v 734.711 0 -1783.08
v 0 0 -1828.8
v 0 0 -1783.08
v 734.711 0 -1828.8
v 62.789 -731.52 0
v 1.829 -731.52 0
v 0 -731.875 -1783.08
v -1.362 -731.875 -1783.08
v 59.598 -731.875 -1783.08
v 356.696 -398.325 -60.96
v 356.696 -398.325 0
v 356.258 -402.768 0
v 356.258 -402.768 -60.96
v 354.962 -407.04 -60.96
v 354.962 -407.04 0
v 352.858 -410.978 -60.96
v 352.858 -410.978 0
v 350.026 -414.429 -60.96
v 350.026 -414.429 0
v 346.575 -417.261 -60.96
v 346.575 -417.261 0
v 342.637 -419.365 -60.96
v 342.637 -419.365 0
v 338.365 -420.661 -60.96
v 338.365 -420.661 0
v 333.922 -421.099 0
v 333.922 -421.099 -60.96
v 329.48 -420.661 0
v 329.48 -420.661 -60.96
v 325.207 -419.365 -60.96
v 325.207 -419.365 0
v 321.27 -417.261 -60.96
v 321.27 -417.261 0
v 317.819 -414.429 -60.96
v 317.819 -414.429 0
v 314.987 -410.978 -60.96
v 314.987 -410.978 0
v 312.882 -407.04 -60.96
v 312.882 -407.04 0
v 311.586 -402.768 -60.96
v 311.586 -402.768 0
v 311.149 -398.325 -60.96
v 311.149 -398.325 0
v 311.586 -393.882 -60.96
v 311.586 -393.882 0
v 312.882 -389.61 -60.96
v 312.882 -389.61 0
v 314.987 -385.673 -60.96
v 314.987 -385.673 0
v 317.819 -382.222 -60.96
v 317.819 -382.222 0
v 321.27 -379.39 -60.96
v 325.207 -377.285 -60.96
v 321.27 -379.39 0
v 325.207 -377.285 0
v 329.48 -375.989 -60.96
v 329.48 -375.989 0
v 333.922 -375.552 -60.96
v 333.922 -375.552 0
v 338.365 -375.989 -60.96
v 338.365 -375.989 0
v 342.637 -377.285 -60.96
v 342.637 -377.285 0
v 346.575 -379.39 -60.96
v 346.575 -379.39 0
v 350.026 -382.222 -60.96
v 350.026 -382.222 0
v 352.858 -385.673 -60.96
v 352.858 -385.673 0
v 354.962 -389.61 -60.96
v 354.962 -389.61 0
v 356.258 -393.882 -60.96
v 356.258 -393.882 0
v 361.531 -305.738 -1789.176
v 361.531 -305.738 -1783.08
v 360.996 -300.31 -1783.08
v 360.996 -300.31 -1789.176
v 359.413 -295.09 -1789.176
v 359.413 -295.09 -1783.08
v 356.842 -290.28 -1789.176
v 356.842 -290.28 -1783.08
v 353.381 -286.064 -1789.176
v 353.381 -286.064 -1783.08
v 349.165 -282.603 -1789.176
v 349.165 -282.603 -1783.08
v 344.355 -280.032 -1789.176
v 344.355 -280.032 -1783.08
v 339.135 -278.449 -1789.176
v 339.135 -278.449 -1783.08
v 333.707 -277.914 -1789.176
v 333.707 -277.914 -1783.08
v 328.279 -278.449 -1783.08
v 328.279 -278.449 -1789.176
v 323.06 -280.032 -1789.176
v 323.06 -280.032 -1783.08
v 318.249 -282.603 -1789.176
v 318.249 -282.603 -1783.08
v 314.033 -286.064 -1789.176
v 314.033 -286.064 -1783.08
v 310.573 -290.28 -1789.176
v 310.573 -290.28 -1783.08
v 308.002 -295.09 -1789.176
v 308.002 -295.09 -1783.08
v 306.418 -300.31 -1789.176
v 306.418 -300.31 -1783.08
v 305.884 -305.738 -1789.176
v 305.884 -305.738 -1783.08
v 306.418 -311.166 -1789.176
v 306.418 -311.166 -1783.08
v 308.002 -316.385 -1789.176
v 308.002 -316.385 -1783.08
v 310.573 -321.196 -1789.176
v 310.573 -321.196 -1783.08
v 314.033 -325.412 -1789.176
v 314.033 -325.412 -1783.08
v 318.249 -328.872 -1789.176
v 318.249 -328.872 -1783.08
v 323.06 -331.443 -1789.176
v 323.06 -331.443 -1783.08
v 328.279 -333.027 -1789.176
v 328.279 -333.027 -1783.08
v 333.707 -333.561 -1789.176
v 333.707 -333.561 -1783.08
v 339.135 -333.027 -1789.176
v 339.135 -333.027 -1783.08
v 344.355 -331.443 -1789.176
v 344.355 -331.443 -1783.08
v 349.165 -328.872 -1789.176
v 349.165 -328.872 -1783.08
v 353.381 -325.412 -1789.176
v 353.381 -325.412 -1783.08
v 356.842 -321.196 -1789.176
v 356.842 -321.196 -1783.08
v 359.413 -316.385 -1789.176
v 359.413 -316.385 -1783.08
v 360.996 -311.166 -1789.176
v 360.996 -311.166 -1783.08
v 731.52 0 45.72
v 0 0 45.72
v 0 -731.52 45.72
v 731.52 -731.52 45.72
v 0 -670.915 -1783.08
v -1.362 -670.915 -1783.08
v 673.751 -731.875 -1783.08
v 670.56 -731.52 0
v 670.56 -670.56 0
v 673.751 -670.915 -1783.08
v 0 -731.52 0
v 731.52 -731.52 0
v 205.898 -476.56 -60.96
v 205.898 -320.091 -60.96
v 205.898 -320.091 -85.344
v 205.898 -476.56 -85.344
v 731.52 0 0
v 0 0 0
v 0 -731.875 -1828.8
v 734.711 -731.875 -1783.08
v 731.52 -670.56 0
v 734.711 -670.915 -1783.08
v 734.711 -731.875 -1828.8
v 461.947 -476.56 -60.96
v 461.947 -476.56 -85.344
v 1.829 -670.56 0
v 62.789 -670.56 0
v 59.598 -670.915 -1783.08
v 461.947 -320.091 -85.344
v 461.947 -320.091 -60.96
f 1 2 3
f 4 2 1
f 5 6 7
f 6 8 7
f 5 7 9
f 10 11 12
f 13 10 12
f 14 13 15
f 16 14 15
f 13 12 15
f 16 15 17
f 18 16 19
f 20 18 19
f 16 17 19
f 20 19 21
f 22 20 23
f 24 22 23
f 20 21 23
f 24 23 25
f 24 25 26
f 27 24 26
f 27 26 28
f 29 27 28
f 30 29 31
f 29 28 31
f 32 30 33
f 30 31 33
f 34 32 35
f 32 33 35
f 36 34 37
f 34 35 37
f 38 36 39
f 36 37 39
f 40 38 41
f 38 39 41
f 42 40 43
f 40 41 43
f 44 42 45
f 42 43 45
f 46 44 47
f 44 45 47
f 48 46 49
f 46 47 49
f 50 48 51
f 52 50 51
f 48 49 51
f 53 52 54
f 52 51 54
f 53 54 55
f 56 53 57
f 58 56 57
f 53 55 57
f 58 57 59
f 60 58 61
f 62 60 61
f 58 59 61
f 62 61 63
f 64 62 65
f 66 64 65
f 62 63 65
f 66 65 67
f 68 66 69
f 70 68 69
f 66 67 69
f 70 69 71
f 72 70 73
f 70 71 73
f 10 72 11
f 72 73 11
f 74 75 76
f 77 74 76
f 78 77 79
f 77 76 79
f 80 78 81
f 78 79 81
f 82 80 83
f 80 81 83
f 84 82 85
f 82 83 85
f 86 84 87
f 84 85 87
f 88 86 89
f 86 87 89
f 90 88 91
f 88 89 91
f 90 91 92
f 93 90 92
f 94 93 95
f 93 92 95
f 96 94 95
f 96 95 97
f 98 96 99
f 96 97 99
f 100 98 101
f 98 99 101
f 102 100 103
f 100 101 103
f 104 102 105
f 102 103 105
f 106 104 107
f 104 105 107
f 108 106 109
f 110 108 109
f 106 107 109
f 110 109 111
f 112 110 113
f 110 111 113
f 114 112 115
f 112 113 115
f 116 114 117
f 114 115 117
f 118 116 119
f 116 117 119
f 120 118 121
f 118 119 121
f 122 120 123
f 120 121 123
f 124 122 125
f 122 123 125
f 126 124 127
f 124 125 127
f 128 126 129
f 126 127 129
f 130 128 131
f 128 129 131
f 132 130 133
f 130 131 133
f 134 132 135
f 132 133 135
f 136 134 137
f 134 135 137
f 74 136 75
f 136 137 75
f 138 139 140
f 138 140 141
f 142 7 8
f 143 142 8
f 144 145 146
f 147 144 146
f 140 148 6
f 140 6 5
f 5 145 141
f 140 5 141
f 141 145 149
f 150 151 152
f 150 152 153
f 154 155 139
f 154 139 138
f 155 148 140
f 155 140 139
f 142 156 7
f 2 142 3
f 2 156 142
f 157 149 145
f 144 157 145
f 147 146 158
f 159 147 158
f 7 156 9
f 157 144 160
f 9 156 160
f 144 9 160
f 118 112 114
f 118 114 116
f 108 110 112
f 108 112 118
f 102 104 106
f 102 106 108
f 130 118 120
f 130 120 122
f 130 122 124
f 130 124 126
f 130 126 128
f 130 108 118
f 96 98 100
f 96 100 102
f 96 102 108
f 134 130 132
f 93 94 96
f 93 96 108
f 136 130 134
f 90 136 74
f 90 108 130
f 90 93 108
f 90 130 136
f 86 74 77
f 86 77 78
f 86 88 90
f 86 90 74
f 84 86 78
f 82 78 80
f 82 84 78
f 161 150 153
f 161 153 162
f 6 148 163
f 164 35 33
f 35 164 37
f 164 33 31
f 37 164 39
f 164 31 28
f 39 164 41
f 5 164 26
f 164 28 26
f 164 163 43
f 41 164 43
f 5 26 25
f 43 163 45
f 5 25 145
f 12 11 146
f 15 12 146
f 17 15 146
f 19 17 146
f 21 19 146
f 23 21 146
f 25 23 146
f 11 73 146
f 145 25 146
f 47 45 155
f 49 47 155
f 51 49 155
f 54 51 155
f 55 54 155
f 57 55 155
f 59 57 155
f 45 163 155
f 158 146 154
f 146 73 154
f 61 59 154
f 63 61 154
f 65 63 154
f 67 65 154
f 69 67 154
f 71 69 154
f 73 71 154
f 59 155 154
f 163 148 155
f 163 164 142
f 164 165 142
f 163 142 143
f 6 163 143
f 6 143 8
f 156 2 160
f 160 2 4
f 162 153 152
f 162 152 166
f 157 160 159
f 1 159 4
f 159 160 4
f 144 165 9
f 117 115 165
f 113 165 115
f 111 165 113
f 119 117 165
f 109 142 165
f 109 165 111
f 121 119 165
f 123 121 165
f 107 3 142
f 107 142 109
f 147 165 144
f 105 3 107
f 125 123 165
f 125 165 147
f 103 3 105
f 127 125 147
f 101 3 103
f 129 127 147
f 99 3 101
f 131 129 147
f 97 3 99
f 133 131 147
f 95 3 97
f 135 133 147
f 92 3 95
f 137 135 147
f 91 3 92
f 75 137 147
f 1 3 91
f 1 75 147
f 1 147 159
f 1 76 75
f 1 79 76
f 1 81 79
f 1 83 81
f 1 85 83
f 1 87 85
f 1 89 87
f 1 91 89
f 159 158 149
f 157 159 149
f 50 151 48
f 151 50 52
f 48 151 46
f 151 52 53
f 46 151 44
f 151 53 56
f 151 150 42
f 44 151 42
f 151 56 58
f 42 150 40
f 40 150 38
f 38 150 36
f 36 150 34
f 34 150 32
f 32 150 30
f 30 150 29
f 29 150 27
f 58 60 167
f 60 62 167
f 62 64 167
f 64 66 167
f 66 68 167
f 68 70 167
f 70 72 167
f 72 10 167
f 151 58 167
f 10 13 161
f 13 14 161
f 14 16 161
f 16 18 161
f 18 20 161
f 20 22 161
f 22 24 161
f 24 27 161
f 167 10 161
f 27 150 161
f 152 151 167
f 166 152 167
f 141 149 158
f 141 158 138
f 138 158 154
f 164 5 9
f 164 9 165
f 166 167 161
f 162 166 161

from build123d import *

# Parameters (mm, degrees)
F0_W      = 731.52
F0_H      = 731.52
F1_DEPTH  = 45.72
F3_W      = 734.7105741501
F3_H      = 731.8749427795
F4_DEPTH  = 45.72
F5_W      = 60.96
F5_H      = 60.96
F6_W      = 60.96
F6_H      = 60.96
F12_R     = 27.8235207136
F13_DEPTH = 6.096
F14_R     = 22.7734806104
F15_DEPTH = 60.96
F16_W     = 256.0497522354
F16_H     = 156.4687490463
F16_R     = 22.7734806104
F17_DEPTH = 24.384


with BuildPart() as f1:
    # F0 (on Top) → F1 (new body)
    with BuildSketch(Plane.XY):
        with Locations((365.76, -365.76)):
            Rectangle(F0_W, F0_H)
    extrude(amount=F1_DEPTH)

    # F14 (on face) → F15 (join)
    with BuildSketch(Plane(origin=(0, 0, 0), x_dir=(1, 0, 0), z_dir=(0, 0, -1))):
        with Locations((333.9223861694, 398.3253240585)):
            Circle(F14_R)
    extrude(amount=F15_DEPTH)



with BuildPart() as f4:
    # F3 (on offset) → F4 (new body)
    with BuildSketch(Plane.XY.offset(-1828.8)):
        with Locations((367.355287075, -365.9374713898)):
            Rectangle(F3_W, F3_H)
    extrude(amount=F4_DEPTH)

    # F12 (on face) → F13 (cut)
    with BuildSketch(Plane.XY.offset(-1783.08)):
        with Locations((333.7072134018, -305.7377934456)):
            Circle(F12_R)
    extrude(amount=-F13_DEPTH, mode=Mode.SUBTRACT)


with BuildPart() as f7:
    # F5 (on face) → F7 section 0
    with BuildSketch(Plane(origin=(0, 0, 0), x_dir=(1, 0, 0), z_dir=(0, 0, -1))):
        with Locations((701.04, 701.04)):
            Rectangle(F5_W, F5_H)
    # F6 (on face) → F7 section 1
    with BuildSketch(Plane.XY.offset(-1783.08)):
        with Locations((704.2305741501, -701.3949427795)):
            Rectangle(F6_W, F6_H)
    loft()


with BuildPart() as f8_1:
    # F8: instance of F7
    add(f7.part.mirror(Plane.YZ))


with BuildPart() as f11_1:
    # F11: instance of F7
    add(f7.part.mirror(Plane.YZ.offset(366.6744)))


with BuildPart() as f1_1:
    add(f1.part)

    add(f4.part)  # F17 merges F4

    add(f7.part)  # F17 merges F7

    add(f11_1.part)  # F17 merges F11_1
    # F16 (on face) → F17 (join)
    with BuildSketch(Plane(origin=(0, 0, -60.96), x_dir=(1, 0, 0), z_dir=(0, 0, -1))):
        with Locations((333.9223861694, 398.3253240585)):
            Rectangle(F16_W, F16_H)
        with Locations((333.9223861694, 398.3253240585)):
            Circle(F16_R, mode=Mode.SUBTRACT)
        with Locations((333.9223861694, 398.3253240585)):
            Circle(F16_R)
    extrude(amount=F17_DEPTH)


solid = f1_1.part
